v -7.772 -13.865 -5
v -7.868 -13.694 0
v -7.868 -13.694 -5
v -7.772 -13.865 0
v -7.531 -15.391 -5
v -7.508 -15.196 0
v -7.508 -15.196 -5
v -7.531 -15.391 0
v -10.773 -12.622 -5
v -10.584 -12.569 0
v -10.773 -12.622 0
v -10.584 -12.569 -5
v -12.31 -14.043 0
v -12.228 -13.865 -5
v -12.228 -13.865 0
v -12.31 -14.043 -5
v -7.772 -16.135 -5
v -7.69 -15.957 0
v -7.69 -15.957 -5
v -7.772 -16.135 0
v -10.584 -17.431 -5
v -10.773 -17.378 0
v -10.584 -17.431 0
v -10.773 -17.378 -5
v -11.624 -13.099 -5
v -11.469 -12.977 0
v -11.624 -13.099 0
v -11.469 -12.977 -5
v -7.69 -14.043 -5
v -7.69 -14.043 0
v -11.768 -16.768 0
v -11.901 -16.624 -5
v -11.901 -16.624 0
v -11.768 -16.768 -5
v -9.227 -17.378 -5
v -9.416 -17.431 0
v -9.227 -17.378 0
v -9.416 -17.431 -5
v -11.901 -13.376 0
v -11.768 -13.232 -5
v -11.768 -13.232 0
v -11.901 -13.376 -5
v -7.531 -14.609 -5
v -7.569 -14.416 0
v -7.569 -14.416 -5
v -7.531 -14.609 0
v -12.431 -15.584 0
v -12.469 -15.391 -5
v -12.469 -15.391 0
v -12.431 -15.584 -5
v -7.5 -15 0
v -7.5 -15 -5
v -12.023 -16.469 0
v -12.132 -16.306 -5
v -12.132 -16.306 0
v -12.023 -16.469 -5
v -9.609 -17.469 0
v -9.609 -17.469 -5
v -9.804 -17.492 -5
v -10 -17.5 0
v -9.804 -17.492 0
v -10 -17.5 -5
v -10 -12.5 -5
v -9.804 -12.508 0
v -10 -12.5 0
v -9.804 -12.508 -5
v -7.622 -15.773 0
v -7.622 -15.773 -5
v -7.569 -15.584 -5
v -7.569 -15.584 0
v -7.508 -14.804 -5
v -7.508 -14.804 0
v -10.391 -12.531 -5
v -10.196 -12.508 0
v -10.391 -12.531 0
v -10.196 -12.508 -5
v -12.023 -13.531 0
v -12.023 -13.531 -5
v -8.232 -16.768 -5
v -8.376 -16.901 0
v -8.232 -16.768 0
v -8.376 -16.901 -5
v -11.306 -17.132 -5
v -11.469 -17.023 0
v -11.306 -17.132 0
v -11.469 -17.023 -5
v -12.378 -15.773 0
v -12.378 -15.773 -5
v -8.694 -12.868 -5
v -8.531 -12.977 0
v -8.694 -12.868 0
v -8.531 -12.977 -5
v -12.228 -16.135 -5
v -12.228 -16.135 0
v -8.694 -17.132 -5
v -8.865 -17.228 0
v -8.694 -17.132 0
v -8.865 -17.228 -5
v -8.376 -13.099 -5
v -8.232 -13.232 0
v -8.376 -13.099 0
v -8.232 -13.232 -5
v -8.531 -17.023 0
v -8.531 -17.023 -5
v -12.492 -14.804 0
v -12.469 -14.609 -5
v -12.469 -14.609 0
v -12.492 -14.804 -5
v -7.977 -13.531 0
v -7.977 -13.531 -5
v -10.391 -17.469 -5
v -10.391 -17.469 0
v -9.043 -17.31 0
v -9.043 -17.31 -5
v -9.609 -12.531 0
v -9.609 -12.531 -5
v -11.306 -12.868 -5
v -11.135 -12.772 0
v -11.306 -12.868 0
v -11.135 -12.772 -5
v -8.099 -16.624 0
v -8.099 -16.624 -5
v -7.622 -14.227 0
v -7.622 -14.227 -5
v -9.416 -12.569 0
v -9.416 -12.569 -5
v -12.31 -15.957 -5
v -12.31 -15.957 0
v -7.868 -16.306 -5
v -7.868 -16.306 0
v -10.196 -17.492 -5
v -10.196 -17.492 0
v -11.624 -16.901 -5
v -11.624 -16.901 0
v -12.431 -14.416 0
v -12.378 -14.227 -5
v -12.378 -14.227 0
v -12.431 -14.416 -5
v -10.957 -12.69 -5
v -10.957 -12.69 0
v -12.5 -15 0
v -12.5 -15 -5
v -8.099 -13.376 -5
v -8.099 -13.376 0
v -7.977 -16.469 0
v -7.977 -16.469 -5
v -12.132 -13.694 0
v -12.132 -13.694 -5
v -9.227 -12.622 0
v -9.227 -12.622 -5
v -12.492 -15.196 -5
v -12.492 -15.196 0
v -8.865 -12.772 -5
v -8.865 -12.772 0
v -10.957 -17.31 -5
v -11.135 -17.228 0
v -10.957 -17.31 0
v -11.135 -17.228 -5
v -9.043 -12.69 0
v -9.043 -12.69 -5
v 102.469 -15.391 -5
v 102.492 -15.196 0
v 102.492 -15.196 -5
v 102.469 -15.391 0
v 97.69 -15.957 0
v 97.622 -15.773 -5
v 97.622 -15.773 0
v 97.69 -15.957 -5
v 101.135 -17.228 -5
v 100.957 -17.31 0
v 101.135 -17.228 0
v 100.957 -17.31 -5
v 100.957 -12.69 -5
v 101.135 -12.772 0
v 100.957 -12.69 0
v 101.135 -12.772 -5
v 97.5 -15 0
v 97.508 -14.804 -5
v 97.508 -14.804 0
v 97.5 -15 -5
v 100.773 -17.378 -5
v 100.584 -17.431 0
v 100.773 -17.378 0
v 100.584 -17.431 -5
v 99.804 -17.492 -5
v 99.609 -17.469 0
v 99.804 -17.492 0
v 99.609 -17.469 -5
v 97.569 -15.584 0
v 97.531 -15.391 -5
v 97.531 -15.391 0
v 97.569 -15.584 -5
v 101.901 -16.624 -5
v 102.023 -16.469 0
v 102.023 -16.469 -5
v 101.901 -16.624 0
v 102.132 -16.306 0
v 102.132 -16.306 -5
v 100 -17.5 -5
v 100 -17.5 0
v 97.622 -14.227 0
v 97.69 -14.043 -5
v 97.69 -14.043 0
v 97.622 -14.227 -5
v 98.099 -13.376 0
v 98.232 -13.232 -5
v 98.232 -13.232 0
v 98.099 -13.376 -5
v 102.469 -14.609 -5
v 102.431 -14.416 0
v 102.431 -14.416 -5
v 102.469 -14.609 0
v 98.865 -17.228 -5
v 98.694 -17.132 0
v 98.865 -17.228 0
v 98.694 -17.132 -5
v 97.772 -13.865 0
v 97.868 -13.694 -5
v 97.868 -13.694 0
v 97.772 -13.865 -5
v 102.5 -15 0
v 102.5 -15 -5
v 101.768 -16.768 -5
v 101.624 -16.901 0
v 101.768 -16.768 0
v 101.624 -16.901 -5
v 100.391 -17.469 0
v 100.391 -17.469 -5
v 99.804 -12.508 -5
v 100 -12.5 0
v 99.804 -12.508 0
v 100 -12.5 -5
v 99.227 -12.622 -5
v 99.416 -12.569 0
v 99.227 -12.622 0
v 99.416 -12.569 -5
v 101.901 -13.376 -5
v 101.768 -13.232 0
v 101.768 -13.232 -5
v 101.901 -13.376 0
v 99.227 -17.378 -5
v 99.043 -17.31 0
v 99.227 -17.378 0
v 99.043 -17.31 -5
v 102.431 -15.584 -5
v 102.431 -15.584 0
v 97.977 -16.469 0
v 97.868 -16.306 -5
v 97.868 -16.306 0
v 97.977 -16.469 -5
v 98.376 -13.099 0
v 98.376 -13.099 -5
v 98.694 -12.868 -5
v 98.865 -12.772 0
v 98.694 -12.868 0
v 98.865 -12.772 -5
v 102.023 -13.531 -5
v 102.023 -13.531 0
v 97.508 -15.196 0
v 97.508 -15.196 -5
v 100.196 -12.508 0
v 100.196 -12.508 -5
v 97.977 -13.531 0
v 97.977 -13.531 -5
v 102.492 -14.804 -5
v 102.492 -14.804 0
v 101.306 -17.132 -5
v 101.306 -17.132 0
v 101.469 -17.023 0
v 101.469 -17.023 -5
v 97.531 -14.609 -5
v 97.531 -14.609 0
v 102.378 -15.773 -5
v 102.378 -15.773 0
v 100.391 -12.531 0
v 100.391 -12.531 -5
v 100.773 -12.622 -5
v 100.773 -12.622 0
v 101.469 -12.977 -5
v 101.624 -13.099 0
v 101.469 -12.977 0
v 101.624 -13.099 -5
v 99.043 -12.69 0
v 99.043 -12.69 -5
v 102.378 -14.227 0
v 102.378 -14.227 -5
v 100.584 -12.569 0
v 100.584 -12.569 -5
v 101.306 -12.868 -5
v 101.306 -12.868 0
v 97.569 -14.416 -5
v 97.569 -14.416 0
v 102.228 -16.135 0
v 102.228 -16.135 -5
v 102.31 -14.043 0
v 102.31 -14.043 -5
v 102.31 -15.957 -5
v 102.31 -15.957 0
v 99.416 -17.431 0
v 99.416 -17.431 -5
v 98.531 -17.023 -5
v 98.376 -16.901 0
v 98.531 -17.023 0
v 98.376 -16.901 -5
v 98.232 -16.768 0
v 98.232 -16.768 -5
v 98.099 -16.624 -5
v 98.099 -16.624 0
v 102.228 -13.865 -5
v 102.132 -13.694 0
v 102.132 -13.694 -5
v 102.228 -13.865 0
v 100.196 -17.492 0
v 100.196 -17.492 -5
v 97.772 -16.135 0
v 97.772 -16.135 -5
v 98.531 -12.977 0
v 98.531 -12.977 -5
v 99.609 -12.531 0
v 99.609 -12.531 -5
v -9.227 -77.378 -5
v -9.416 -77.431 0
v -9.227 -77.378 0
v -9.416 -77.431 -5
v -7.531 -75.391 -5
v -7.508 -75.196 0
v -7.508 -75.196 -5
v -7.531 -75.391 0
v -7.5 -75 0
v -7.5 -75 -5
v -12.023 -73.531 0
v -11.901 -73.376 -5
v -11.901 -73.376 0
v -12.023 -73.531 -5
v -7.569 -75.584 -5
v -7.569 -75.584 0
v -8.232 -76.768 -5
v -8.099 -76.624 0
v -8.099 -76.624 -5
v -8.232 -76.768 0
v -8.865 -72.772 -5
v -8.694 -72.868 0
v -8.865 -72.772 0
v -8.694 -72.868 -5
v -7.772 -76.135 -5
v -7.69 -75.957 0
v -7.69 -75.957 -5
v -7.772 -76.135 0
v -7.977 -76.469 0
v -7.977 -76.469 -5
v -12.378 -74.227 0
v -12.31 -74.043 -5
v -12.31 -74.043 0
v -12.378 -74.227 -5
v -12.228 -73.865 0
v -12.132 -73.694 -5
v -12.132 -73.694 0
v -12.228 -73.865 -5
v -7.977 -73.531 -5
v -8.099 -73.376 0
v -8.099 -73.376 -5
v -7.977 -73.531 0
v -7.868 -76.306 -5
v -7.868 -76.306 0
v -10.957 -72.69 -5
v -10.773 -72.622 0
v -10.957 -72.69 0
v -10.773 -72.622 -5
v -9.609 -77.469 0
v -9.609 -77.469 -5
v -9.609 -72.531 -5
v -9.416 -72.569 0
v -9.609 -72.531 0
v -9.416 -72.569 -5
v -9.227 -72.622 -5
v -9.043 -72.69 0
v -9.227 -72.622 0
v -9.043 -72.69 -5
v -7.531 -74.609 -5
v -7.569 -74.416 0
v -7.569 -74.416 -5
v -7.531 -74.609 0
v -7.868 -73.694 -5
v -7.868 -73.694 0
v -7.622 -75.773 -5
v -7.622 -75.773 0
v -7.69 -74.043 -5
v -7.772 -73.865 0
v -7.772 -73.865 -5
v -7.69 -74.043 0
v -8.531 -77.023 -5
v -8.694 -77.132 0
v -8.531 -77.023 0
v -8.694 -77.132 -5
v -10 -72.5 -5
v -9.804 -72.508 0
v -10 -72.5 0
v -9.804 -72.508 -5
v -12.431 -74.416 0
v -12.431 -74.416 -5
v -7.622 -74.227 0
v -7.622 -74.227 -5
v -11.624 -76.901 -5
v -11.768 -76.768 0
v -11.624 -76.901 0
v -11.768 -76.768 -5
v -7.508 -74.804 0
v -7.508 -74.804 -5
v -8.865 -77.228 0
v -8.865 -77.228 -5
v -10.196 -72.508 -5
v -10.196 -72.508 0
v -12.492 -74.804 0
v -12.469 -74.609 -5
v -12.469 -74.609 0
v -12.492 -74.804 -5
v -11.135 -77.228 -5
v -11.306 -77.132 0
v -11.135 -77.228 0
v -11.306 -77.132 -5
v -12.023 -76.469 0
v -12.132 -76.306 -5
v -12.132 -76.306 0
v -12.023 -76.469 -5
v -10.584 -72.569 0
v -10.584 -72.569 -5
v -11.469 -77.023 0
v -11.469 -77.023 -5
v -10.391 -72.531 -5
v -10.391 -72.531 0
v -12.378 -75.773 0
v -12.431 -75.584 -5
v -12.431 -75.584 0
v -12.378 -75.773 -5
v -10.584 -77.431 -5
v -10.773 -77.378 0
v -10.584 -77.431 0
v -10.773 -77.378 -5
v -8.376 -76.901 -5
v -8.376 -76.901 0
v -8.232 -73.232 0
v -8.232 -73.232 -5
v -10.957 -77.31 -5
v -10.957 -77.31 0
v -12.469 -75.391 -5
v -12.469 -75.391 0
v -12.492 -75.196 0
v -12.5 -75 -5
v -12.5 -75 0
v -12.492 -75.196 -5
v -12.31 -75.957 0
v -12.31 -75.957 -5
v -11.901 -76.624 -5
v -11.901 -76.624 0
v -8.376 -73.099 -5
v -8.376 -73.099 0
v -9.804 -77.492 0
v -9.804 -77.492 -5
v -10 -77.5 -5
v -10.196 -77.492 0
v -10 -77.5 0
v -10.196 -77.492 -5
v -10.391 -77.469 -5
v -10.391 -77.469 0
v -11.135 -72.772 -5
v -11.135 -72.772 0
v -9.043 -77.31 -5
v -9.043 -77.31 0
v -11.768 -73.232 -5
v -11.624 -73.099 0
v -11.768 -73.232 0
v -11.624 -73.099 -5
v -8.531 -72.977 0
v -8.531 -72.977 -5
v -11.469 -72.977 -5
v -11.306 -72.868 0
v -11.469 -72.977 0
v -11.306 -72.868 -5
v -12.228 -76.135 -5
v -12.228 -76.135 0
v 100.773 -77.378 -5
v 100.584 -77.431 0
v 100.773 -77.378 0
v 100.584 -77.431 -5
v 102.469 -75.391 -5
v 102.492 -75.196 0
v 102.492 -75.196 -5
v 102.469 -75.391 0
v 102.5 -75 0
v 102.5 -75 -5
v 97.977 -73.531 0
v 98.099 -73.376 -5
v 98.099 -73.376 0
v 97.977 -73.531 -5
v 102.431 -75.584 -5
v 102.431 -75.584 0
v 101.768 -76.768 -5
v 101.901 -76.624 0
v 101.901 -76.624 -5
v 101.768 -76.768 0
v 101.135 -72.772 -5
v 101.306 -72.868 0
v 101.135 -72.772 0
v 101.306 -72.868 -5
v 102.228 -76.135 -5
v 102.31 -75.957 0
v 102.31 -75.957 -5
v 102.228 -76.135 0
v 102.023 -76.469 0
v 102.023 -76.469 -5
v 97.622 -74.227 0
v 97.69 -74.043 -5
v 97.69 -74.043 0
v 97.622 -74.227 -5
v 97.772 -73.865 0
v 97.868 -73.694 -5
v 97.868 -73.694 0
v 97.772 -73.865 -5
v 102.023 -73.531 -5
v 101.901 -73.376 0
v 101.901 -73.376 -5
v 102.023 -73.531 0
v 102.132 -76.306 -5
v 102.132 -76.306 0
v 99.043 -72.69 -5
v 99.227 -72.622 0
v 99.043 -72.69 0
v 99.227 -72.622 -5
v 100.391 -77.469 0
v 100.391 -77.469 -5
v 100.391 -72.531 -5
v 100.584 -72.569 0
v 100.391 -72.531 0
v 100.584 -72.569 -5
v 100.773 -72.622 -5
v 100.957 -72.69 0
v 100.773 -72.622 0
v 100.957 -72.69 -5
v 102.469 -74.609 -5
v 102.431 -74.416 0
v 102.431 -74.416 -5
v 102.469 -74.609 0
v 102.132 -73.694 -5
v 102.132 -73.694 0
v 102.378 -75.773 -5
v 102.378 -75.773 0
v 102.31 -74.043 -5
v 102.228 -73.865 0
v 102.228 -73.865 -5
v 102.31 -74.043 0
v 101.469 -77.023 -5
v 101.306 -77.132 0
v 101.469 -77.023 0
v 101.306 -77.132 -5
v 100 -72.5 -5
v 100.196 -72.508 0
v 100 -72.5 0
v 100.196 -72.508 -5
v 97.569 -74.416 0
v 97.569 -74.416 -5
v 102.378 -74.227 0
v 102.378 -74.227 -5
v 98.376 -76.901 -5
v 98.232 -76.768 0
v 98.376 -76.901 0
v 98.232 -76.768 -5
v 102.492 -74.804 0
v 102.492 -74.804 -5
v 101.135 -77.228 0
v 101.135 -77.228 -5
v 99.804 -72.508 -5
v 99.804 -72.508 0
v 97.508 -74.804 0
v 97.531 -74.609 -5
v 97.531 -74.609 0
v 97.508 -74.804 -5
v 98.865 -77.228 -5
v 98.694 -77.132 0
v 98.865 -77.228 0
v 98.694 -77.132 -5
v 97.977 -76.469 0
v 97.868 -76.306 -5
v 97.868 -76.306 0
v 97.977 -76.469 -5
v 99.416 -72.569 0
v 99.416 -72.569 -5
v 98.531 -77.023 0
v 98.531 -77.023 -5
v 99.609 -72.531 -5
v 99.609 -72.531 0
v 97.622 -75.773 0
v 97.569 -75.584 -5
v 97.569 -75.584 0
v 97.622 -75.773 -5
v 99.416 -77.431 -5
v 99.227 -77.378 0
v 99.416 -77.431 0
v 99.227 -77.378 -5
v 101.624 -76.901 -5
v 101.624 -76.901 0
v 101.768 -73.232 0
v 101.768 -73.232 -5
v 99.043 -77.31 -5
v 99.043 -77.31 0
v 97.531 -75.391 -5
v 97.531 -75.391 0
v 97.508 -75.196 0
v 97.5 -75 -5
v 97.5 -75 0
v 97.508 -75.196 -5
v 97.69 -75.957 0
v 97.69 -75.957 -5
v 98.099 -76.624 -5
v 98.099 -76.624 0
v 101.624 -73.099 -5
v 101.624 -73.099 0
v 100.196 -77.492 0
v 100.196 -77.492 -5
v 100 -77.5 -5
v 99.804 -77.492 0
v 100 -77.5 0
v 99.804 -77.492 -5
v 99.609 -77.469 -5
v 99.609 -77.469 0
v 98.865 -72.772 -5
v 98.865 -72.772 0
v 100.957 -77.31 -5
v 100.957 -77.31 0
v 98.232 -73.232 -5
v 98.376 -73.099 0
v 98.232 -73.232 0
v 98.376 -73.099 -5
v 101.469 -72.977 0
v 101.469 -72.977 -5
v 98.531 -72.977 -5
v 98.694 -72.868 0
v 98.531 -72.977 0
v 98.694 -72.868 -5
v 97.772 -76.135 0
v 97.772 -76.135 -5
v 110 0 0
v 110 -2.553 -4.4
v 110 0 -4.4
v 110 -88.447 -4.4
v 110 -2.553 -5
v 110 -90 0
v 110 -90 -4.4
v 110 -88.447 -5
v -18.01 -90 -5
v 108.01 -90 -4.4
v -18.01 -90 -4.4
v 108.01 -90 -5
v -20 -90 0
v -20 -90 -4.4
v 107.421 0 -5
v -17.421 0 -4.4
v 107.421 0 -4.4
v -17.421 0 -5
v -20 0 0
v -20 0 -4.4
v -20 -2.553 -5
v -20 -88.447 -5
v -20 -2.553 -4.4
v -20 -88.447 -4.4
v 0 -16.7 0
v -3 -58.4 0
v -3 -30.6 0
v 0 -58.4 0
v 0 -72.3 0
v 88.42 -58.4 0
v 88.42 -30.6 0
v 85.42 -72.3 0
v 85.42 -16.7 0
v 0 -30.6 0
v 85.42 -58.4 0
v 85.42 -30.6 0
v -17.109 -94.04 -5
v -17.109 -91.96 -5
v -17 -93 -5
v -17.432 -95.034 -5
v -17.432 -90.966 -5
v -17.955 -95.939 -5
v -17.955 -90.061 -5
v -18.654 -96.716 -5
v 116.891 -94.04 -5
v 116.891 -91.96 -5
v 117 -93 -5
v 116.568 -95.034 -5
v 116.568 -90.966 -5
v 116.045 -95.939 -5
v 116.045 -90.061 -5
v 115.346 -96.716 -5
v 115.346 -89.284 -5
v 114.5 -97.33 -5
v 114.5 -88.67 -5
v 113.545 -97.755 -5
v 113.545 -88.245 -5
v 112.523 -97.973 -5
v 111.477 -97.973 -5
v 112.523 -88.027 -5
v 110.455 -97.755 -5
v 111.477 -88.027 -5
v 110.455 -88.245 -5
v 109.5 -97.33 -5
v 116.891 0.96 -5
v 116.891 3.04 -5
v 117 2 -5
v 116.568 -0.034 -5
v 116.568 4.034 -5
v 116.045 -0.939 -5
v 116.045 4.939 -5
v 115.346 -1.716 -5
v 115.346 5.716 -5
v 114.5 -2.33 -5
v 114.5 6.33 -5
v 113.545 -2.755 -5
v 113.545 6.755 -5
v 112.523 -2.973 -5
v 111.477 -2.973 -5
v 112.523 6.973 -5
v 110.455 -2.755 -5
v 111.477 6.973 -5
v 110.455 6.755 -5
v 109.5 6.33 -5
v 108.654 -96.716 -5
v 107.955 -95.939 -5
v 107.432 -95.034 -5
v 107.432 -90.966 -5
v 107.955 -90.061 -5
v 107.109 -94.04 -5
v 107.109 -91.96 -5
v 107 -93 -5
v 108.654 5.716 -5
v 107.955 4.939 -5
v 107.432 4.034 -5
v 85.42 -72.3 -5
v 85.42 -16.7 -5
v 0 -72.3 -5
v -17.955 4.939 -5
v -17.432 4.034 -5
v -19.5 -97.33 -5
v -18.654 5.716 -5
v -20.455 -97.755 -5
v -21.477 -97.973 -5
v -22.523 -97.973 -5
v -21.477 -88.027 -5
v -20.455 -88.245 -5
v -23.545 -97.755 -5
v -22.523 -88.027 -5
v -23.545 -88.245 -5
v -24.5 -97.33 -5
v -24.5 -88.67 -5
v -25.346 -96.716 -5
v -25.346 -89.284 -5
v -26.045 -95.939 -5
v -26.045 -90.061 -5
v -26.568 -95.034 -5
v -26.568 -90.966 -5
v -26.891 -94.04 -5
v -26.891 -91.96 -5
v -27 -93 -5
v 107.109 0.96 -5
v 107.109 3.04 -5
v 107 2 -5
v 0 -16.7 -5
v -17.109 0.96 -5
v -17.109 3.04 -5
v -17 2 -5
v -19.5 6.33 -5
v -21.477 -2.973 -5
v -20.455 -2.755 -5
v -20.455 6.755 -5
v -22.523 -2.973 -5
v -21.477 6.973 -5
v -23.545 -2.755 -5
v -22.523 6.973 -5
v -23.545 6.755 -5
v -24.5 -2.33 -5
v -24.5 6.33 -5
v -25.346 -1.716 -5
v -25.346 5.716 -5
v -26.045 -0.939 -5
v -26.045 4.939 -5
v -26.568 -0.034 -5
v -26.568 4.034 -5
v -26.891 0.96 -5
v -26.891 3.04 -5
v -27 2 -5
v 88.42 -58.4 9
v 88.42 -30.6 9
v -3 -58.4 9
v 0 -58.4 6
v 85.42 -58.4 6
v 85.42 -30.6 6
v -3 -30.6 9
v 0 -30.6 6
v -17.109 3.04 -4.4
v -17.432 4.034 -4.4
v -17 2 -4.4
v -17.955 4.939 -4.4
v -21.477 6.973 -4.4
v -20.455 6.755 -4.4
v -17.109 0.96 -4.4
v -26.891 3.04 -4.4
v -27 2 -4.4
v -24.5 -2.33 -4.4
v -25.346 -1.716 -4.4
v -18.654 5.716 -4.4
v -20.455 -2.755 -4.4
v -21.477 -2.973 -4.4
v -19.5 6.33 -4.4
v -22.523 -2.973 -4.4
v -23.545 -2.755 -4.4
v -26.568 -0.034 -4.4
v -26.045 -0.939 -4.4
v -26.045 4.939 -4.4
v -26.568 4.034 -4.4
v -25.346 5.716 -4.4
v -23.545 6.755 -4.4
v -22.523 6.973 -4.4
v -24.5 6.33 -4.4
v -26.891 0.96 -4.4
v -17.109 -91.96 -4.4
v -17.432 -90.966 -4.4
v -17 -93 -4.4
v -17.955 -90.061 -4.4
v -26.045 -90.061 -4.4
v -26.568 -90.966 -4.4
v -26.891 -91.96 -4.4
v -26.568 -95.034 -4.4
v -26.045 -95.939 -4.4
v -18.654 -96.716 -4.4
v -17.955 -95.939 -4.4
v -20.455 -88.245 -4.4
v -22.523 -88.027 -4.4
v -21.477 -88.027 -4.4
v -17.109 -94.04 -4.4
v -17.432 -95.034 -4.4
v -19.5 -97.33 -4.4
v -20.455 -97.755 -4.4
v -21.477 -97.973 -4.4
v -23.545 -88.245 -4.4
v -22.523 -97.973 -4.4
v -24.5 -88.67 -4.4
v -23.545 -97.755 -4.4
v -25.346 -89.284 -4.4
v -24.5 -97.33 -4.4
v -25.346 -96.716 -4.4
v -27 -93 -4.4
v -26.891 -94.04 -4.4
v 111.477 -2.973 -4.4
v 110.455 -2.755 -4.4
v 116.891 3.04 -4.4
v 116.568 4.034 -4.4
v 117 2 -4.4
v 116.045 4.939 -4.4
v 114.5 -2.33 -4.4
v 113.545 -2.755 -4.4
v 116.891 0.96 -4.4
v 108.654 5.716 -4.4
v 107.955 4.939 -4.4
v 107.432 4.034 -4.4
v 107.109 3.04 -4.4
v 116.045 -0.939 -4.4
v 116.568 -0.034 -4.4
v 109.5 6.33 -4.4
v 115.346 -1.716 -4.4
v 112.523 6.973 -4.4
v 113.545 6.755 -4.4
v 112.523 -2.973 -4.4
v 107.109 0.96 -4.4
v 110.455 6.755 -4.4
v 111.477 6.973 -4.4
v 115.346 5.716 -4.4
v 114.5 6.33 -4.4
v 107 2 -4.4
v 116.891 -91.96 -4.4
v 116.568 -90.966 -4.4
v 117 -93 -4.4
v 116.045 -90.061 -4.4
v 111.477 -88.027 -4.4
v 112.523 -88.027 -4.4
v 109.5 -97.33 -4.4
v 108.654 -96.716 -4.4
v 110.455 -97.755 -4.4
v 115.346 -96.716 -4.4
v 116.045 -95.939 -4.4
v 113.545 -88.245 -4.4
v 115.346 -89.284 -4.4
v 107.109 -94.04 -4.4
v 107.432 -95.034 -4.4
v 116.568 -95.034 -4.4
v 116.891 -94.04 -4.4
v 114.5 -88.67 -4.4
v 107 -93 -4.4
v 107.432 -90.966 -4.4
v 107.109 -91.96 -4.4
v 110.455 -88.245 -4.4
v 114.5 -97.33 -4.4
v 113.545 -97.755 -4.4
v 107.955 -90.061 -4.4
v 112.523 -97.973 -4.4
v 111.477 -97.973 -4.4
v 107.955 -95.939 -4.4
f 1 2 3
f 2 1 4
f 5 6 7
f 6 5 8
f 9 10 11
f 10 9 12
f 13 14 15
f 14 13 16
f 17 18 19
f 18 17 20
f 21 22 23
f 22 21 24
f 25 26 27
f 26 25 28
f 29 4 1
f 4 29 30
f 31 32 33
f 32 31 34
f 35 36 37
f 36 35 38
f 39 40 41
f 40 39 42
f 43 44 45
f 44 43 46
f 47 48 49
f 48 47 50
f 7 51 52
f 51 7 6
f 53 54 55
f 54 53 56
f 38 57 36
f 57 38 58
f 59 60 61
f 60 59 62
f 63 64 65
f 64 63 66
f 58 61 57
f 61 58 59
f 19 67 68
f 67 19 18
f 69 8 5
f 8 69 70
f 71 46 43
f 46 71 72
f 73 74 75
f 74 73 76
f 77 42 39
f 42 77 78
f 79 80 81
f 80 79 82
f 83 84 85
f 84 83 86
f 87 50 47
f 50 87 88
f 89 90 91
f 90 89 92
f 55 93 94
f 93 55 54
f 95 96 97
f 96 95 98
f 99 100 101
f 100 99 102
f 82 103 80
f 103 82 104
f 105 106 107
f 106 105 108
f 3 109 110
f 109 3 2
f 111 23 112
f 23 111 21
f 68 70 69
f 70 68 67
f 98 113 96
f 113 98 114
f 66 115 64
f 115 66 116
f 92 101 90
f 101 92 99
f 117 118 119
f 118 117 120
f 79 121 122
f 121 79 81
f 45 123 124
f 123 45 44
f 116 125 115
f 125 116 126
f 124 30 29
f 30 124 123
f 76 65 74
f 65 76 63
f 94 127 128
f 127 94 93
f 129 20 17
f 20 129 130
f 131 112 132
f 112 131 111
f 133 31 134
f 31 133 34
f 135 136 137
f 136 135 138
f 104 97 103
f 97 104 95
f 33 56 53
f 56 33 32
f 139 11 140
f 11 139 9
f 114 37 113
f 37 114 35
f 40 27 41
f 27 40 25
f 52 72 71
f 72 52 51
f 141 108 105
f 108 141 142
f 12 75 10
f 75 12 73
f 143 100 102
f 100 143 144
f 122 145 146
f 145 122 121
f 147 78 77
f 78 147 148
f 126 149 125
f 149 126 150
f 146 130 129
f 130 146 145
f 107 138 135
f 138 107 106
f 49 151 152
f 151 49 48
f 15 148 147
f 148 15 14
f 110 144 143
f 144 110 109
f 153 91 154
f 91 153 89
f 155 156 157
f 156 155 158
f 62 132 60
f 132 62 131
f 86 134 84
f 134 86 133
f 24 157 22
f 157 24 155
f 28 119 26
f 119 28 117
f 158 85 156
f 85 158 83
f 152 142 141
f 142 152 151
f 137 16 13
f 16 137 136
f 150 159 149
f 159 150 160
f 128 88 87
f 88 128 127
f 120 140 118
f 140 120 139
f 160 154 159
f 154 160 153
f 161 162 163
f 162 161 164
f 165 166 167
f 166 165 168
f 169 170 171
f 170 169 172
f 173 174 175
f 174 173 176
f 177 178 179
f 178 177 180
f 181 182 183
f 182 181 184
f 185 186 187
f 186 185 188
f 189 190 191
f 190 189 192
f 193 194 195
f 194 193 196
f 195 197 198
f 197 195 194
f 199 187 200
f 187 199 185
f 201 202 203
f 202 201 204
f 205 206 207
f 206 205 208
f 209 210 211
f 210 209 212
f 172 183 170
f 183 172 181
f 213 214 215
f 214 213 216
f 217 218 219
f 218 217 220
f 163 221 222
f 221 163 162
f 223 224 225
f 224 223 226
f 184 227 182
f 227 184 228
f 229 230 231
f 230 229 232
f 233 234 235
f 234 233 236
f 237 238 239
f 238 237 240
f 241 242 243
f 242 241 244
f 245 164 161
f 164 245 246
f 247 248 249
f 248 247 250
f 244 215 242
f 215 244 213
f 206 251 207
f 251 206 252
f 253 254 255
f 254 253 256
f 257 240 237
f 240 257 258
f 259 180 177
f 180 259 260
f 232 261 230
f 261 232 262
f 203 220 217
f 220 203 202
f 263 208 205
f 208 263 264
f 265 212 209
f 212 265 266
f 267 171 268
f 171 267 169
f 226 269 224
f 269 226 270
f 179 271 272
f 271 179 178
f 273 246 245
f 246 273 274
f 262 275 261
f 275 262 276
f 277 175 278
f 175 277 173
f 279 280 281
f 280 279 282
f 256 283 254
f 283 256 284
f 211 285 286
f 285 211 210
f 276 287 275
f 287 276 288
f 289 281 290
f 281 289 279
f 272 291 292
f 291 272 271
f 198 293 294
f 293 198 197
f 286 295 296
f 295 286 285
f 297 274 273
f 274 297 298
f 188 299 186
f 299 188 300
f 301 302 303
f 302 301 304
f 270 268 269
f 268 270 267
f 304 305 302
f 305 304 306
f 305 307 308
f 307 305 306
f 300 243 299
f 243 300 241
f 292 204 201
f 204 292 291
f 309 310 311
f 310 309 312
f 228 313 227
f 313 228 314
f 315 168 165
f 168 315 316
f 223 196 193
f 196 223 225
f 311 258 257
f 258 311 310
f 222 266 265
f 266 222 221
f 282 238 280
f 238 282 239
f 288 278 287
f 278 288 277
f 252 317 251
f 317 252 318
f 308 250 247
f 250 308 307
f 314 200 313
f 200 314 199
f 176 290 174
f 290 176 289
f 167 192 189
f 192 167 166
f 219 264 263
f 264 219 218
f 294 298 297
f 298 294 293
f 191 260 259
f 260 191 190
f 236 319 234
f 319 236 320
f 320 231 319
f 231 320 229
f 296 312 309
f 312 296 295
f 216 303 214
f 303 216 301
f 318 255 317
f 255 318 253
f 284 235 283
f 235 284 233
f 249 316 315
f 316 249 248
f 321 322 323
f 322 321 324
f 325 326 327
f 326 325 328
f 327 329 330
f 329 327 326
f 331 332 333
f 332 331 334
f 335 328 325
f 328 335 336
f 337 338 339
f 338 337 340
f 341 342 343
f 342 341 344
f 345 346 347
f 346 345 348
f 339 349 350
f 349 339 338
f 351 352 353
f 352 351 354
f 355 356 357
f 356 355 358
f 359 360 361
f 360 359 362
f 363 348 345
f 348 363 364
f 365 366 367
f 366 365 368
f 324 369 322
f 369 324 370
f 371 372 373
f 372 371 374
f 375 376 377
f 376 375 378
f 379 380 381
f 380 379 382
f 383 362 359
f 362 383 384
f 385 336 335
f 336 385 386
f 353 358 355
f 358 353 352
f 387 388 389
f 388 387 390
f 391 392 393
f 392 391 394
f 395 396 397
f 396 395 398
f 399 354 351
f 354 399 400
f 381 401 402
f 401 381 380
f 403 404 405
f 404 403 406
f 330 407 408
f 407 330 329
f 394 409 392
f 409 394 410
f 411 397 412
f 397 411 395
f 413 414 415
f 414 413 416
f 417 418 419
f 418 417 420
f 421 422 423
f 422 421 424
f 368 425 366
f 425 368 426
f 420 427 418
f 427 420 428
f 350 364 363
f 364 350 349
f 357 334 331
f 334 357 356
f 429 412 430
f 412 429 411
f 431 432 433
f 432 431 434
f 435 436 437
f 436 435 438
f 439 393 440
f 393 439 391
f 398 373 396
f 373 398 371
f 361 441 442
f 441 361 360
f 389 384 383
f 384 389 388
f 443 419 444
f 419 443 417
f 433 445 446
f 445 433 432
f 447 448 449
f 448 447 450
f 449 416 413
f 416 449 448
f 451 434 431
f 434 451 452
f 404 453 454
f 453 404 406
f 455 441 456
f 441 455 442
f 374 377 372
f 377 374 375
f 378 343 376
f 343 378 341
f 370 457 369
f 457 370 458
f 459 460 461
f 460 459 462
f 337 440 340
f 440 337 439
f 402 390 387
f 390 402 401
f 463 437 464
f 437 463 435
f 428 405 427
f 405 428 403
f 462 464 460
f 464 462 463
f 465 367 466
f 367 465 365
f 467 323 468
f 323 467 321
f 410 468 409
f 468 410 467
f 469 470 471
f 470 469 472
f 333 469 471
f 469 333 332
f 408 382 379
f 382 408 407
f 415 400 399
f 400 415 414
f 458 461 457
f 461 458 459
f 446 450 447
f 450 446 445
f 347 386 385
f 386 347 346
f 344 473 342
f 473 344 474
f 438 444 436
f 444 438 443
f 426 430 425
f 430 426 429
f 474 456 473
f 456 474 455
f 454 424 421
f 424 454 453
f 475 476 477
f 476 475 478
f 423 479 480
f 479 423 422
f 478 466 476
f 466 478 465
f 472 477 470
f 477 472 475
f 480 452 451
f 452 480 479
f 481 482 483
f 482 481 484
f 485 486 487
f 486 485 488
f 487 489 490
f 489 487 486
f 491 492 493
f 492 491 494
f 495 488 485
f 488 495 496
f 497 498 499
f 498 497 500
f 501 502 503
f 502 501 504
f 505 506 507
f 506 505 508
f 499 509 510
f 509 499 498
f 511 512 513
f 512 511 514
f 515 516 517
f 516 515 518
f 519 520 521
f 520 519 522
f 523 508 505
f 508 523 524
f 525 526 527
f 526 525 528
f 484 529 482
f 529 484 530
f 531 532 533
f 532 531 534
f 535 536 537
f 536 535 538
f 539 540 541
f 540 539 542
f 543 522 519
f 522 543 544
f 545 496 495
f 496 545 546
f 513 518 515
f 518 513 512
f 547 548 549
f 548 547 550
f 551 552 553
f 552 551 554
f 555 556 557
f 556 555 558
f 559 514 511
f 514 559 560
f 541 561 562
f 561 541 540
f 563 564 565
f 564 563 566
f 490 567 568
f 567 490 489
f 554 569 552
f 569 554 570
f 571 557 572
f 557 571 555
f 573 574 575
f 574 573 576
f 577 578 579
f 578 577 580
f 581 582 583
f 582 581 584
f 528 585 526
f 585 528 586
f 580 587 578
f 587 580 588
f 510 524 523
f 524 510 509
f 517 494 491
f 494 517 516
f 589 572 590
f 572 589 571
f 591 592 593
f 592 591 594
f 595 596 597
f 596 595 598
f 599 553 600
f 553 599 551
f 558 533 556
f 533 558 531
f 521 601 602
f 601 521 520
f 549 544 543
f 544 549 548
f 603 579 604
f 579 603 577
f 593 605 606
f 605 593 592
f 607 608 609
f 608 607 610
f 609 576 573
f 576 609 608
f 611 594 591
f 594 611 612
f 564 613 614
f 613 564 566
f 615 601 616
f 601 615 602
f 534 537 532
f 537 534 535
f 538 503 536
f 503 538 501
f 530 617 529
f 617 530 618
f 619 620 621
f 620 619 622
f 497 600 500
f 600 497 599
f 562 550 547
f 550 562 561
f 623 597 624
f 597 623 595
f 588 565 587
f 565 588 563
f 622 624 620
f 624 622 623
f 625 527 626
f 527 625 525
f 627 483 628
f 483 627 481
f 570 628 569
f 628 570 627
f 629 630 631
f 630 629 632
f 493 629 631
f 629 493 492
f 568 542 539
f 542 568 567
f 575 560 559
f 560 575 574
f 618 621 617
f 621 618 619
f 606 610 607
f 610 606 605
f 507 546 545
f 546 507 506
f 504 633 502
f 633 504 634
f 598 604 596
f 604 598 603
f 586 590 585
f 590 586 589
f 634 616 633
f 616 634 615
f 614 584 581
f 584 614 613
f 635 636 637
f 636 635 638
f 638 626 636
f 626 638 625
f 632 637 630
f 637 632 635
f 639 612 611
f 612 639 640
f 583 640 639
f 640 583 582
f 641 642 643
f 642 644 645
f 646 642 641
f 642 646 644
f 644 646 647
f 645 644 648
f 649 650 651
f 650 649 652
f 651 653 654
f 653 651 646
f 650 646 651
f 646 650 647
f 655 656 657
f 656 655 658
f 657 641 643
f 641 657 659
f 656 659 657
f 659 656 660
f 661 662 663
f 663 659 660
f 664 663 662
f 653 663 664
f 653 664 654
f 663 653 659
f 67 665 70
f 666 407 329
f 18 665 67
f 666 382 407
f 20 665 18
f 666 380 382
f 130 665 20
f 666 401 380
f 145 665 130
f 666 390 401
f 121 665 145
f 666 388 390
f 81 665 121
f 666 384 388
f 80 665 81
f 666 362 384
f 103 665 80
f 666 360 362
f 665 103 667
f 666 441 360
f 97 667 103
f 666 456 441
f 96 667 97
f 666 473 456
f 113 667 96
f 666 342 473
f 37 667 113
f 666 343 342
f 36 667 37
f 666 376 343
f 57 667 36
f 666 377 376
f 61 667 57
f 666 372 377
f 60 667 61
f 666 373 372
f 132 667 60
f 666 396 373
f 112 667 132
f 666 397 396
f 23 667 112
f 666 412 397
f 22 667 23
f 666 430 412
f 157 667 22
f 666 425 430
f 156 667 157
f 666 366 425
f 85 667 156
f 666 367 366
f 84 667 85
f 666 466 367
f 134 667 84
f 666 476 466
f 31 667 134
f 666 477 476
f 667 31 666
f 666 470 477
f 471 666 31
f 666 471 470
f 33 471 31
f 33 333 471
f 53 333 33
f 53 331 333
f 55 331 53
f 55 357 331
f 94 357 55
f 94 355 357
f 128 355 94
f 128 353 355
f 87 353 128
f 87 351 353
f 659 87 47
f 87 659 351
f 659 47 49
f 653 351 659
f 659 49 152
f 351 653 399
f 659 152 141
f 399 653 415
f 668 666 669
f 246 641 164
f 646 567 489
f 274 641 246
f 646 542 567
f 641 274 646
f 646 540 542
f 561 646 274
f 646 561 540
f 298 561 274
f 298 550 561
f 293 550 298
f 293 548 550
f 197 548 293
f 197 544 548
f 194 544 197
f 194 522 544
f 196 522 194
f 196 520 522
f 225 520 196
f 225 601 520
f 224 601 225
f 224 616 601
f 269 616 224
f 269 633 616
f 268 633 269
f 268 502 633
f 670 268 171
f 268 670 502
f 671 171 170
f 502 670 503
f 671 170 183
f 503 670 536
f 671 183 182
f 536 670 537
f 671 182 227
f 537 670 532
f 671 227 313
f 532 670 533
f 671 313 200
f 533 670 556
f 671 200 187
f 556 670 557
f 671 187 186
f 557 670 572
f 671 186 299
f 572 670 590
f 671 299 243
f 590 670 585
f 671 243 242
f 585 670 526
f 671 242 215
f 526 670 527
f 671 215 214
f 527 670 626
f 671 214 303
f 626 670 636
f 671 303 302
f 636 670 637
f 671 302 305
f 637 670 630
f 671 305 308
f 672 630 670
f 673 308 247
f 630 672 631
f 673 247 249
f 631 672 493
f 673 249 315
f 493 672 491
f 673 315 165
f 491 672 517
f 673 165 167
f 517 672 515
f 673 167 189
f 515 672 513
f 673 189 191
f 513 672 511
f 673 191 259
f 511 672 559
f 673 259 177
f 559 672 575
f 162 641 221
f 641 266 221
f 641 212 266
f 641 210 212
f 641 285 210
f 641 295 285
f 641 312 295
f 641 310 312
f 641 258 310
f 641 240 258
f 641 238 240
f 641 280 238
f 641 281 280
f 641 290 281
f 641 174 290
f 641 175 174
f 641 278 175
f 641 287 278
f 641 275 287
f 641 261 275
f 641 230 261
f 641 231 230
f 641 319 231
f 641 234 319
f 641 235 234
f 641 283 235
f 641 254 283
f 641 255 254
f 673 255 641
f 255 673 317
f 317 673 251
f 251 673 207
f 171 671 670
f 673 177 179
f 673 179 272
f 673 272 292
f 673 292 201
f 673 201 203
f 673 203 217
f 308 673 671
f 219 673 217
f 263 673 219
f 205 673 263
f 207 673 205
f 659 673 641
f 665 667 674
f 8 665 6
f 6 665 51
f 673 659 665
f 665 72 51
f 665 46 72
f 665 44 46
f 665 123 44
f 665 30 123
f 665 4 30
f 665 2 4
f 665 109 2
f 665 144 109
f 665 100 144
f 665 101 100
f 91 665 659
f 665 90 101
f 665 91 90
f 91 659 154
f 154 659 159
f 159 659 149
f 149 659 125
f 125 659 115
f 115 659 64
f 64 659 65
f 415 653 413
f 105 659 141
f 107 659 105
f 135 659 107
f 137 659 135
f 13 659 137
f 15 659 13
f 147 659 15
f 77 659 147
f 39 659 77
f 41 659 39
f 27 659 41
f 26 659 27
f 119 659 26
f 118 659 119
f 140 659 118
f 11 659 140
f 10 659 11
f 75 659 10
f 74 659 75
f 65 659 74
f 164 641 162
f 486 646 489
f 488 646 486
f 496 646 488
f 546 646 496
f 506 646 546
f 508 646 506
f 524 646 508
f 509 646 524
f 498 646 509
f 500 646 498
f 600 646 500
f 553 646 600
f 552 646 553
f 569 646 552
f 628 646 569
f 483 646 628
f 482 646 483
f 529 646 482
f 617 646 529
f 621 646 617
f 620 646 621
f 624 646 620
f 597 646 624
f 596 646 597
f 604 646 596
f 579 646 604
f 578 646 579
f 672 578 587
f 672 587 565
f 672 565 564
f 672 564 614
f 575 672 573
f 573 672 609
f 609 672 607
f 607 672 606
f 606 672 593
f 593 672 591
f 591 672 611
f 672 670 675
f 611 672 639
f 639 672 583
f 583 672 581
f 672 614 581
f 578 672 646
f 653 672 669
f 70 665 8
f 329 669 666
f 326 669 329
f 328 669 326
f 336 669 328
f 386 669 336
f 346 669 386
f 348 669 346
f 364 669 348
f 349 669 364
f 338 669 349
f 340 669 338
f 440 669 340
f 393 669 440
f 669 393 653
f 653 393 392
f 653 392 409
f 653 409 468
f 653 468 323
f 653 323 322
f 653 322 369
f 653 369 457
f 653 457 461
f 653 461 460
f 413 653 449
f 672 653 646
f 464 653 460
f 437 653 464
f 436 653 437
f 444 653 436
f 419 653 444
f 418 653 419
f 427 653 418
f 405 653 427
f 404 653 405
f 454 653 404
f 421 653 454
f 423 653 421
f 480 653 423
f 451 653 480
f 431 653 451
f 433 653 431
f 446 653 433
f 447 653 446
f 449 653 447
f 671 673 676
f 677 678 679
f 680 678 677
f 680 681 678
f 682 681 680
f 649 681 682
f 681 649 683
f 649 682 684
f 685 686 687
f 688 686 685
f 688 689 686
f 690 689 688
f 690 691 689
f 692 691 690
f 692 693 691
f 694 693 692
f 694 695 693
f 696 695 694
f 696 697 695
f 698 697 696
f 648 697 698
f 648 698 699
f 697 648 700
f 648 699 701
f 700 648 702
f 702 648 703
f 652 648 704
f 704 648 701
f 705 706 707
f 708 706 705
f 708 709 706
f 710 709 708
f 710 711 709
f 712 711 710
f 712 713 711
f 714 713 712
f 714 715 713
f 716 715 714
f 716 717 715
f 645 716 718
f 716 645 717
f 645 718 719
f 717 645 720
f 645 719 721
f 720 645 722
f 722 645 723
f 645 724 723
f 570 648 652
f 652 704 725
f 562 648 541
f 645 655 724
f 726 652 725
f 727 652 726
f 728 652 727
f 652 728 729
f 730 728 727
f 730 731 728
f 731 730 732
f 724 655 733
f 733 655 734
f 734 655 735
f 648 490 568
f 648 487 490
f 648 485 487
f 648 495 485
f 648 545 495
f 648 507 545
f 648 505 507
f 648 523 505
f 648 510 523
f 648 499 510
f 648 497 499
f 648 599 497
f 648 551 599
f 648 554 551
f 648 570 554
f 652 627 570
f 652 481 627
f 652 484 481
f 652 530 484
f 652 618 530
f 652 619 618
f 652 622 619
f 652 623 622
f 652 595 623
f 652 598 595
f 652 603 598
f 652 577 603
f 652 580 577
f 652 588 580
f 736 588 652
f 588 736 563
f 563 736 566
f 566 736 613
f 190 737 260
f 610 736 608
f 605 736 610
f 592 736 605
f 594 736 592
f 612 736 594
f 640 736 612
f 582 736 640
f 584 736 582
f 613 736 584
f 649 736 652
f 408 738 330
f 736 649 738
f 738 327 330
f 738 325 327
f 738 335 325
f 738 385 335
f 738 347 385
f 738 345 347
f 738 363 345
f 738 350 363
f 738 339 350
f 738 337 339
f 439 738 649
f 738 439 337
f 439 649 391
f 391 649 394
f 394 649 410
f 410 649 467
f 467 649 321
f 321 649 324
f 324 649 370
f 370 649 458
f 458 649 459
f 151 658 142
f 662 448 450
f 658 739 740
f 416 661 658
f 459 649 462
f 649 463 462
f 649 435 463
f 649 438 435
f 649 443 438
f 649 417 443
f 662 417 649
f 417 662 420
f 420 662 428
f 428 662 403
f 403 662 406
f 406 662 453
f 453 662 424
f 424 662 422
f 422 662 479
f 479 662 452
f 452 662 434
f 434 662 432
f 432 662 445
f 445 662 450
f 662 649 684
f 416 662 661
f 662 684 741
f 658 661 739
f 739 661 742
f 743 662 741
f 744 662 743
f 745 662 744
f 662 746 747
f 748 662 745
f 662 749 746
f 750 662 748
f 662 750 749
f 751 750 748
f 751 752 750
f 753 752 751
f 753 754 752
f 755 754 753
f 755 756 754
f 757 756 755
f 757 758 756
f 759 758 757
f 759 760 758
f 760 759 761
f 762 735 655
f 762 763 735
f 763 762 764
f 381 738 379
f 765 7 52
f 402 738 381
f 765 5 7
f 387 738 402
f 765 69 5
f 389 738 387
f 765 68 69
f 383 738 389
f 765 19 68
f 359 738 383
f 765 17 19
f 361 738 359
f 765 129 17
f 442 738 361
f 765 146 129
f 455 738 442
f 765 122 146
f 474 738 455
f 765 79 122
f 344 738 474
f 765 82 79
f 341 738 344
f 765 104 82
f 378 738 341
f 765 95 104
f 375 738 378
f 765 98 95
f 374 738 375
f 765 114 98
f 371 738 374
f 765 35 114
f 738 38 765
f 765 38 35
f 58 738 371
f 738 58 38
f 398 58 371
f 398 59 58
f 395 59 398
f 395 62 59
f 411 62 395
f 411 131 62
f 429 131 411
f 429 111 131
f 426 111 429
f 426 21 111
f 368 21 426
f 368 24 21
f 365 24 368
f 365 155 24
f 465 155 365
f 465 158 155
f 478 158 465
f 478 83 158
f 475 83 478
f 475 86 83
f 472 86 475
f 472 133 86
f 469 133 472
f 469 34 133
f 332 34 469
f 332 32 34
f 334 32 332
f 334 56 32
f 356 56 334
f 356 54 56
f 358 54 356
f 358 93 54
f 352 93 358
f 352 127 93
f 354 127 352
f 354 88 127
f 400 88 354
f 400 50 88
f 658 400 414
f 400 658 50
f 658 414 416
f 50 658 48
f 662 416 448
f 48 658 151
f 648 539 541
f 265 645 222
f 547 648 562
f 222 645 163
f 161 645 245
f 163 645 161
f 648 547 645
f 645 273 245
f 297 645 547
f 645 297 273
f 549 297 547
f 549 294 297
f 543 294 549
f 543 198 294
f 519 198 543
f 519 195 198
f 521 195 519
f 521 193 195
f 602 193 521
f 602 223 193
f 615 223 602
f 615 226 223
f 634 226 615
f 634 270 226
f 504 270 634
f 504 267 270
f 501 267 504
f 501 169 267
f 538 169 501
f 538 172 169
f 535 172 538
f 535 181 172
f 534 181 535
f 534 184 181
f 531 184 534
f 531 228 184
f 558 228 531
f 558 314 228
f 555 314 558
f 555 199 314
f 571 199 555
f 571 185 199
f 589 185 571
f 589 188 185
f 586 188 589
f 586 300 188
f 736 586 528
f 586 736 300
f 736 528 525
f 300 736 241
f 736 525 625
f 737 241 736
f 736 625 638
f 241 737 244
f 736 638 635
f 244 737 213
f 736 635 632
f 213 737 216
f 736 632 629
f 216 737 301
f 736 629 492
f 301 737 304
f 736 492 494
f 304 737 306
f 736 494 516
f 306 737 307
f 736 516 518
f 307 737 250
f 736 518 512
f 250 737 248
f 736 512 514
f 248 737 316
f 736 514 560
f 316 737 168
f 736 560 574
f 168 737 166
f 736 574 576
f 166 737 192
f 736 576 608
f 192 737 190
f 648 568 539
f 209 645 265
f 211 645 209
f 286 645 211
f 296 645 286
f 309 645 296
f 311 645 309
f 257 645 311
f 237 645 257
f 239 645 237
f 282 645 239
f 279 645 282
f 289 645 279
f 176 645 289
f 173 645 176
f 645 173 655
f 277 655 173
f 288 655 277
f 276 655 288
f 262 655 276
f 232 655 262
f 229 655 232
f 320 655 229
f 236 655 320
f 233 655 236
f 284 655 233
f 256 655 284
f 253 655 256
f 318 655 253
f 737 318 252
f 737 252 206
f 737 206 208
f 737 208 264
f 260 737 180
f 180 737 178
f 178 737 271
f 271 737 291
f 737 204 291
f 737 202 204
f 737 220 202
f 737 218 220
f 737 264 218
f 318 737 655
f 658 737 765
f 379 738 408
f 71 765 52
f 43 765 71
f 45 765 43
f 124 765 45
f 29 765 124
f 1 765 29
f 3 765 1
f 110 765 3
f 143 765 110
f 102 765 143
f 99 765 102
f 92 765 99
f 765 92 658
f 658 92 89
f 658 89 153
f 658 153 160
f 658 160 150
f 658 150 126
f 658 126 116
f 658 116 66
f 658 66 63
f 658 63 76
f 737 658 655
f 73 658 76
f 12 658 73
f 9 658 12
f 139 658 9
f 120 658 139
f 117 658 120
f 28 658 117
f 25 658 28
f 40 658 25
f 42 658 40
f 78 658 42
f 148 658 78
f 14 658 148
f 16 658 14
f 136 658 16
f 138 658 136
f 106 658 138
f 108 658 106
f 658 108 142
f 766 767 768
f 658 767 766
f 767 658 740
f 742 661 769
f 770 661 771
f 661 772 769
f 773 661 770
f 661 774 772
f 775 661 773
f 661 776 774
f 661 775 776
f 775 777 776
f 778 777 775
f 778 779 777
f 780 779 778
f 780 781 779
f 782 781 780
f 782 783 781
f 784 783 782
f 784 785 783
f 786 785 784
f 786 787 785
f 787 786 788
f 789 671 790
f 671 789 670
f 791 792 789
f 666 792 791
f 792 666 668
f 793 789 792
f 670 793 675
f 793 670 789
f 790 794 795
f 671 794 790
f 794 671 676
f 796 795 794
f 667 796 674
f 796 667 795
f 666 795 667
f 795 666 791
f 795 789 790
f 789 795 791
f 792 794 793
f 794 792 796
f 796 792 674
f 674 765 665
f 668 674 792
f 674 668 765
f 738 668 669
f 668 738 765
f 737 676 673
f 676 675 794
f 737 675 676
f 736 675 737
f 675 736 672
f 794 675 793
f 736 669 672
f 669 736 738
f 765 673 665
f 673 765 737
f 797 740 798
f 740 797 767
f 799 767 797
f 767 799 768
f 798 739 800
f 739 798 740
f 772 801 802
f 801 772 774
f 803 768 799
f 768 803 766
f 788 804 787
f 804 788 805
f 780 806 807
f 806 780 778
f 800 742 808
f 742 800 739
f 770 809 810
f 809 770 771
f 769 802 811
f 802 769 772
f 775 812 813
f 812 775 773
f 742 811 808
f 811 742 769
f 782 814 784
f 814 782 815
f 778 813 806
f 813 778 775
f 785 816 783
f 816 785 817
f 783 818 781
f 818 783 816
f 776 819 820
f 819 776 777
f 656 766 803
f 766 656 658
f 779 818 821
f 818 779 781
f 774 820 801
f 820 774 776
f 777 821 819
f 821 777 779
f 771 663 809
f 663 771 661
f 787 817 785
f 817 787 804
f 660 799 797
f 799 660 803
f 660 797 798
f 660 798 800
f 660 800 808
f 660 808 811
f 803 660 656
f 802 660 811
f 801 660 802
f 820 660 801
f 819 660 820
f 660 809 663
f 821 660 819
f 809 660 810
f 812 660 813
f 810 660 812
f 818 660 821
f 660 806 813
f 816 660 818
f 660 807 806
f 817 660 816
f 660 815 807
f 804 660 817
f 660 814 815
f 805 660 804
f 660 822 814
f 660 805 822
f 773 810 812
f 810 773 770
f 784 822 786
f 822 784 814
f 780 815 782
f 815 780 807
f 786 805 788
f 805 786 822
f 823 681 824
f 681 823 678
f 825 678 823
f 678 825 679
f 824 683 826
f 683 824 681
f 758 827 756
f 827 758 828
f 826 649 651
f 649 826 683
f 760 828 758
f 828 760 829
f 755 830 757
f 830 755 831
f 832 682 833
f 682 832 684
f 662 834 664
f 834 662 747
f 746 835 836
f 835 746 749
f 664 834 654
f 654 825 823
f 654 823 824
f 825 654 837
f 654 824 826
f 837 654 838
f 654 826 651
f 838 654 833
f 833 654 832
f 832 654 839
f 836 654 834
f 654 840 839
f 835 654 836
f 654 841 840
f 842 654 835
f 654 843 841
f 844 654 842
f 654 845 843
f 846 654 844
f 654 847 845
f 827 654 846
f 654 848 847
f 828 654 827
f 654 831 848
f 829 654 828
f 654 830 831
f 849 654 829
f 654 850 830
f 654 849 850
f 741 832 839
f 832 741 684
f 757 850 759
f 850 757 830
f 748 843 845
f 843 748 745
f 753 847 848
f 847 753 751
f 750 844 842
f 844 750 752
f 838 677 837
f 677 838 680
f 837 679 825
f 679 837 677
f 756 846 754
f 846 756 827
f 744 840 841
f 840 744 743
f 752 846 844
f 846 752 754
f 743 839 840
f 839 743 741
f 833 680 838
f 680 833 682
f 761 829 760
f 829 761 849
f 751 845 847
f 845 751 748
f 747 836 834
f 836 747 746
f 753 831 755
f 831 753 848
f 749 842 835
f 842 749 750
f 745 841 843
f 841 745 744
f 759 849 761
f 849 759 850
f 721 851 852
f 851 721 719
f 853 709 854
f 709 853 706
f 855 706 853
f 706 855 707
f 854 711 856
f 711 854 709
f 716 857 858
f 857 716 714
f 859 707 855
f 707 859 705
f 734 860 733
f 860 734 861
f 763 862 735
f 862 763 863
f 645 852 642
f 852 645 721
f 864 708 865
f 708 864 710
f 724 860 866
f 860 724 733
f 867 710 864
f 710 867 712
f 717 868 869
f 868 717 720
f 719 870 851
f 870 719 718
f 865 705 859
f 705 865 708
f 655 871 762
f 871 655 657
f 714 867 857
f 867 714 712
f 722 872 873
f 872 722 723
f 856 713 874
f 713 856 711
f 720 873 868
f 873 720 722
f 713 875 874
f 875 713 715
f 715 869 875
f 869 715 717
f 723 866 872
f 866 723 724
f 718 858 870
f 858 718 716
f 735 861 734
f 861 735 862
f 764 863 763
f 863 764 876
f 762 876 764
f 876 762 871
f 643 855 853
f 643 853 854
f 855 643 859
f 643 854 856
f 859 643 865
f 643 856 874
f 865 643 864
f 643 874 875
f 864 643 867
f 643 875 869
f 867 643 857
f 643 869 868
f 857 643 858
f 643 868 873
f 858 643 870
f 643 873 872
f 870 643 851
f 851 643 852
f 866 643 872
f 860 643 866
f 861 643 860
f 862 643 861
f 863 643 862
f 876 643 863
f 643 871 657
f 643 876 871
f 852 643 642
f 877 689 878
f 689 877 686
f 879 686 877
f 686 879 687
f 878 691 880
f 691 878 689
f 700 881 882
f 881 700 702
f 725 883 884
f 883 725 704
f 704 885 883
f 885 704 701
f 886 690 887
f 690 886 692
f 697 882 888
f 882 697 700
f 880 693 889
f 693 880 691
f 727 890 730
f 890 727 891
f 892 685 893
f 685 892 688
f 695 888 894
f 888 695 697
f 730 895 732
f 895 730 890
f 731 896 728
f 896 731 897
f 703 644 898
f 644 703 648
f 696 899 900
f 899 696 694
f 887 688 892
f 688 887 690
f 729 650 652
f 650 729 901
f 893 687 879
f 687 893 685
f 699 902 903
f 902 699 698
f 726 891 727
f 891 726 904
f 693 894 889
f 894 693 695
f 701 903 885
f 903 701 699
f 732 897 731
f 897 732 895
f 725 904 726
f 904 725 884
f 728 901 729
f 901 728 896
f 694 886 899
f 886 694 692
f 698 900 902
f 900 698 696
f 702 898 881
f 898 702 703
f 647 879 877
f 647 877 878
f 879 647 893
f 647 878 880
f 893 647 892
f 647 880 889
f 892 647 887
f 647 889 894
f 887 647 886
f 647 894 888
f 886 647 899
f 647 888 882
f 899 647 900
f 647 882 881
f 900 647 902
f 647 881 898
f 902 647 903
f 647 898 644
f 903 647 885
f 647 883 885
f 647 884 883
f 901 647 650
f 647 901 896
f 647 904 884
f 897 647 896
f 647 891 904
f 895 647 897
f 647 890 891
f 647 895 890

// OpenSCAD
// file: ../led.scad
/*
 * This code is licensed under the CC BY-NC-SA 4.0 (Attribution-NonCommercial-ShareAlike).
 * Please read LICENCE.md for full details.
 *
 * Various modules for LED mounts
 */

module Led(d,t) {
    translate([0,0,-1])
        cylinder(r=(d/2)+.25, h=t+2, $fn=80);
    // Show cutout for walls too thick for a 3mm LED
    if( t > 3 ) {
        //translate([0,0,3])
        Led(4,t-3);
    }
}

module Led3(t) {
    Led(3,t);
}

module Led5(t) {
    Led(5,t);
}

Led3(5);
// file: ../raspberryPiTray.scad
/*
 * This code is licensed under the CC BY-NC-SA 4.0 (Attribution-NonCommercial-ShareAlike).
 * Please read LICENCE.md for full details.
 *
 * Raspberry PI mount
 *
 * Hat specification:
 * https://github.com/raspberrypi/hats/blob/master/hat-board-mechanical.pdf
 */

use <warpDisk.scad>;
use <boltHoles.scad>;
use <led.scad>;
use <faceplate.scad>;

// Led size, either 5 or 3mm depending on the available LED's
//ledSize=5;
ledSize=3;

/*
 * height   height of panel in U, default 1
 */
module RaspberryPI( height=1 ) {
    union() {
        // Face plate
        FacePlate(height);

        // PI mounting plate
        translate([ 15, -1, 0]) difference() {
            // frame
            union() {
                cube([ 57, 76, 5 ]);
                WarpDisk(57,80,0);
                WarpDisk(0,80,0);
                //WarpDisk(57,0,0);
                //WarpDisk(0,0,0);
            }

            // cut out unwanted space to save plastic
            translate([10, 15, -1])
                cube([57-20, 55, 7]);

            translate([0, 10, 0]) {
                translate([3.5, 3.5, 0]) {
                    RaspberryPIHole();
                    translate([49, 0, 0]) RaspberryPIHole();
                    translate([0, 58, 0]) {
                        RaspberryPIHole();
                        translate([49, 0, 0]) RaspberryPIHole();
                    }
                }
            }
        }
    }
}

module RaspberryPIHole() {
    MHole(2.5,5);
    MHole(6,2);
}

// RaspberryPI with 3mm led's.
// The led's are arranged with a single one at the top
// and 4 at the bottom in a 2x2 arrangement
module RaspberryPI_3mLed() {
    difference() {
        RaspberryPI();

        // Top LED
        translate([ 5, 0, 15]) rotate([90,0,0]) Led(ledSize, 5);

        // Bottom LED's
        translate([85, 0, 10]) rotate([90,0,0]) Led(ledSize, 5);
        translate([85, 0, 20]) rotate([90,0,0]) Led(ledSize, 5);

        translate([77.5, 0, 10]) rotate([90,0,0]) Led(ledSize, 5);
        translate([77.5, 0, 20]) rotate([90,0,0]) Led(ledSize, 5);
    }
}
// file: ../faceplate.scad
/*
 * This code is licensed under the CC BY-NC-SA 4.0 (Attribution-NonCommercial-ShareAlike).
 * Please read LICENCE.md for full details.
 *
 * Faceplates
 *
 */

use <boltHoles.scad>;

rack1UWidth=30;
rack1UHeight=90;
rack1UHmargin=20;
facePlateThickness=5;

/*
 * Basic faceplate placed in the correct location & mounting holes present.
 *
 * width    width in U
 * height   height in U, default 1
 * holes    custom hole position as a vector. Default [1] for width=1, or [1,3w-1] for width >=2
 */
module FacePlate(width, height=1, holes, fpt=facePlateThickness) {
    // Number & position of mounting holes
    holeStep = holes ? holes : width < 2 ? [1] : [1,(3*width)-2];
    h = (2*rack1UHmargin) + (height*rack1UHeight);

    translate([ -rack1UHmargin, -fpt, 0])
        difference() {
            cube([ h,
                   fpt,
                   width * rack1UWidth ]);

            for( x = holeStep ) {
                translate([10, 5, 5+(10*x)])
                    rotate([90,0,0])
                    MHole(4, fpt+2);

                translate([(height*rack1UHeight)+rack1UHmargin+10, 5, 5+(10*x)])
                    rotate([90,0,0])
                    MHole(4, fpt+2);
            }
        }
}
// file: ../boltHoles.scad
/*
 * This code is licensed under the CC BY-NC-SA 4.0 (Attribution-NonCommercial-ShareAlike).
 * Please read LICENCE.md for full details.
 *
 * A set of modules for creating bolt holes at specific sizes
 *
 * All of these modules will render flat on the XY plane and centered on the origin.
 * Heights are measured along the Y axis.
 * Widths are measured along the X axis.
 * Thickness are measured along the Z axis.
 */

/*
 * M mounting hole. Radius is (Msize/2) + 0.25mm
 * The 0.5mm gives some extra room so the bolt does not get restricted by the plastic & is free to move.
 *
 * size The size of the hole, e.g. 4 for a M4 bolt
 * t    The thickness of the material the hole is in
 */
module MHole(size,t) {
    translate([0, 0, -1]) cylinder( r=(size/2)+.5, h=t+2, $fn=80);
}

/*
 * A rectangular slotted hole for bolts, used so there's some directional movement in attaching something.
 *
 * boltSize     The diameter of the bolt this slot is to fit. 0.5mm either side will be included in the slot
 * height       The height of the slot in mm
 * thickness    The thickness of the material the slot is to cut out.
 */
 module BoltSlot( boltSize,height, thickness) {
    translate([-(boltSize+1)/2,-height/2,-(thickness+1)/2])
        cube([boltSize+1, height, thickness+1]);
 }

/*
 * A bar with multiple slots cut out of it
 *
 * width The width of the bar
 * height The height of the bar
 * thickness The thickness of the bar
 * boltSize The size of bolt that will be used in the slot, remember slots are 10mm apart!
 * baseOffset The offset from the bottom to the bottom of the slot
 * topOffset The offset from the top of the slot from the top of the bar
 */
module SlottedBar(width, height, thickness, boltSize, baseOffset, topOffset) {
    bo = baseOffset <=0 ? thickness : baseOffset;
    to = topOffset <= 0 ? thickness : topOffset;
    
    // Y offset to middle of slot
    dy = baseOffset + ((height-baseOffset-topOffset)/2);
    
    // last slot index that fits, first slot is #0
    numSlots = floor(width/10)-1;
    
    translate([-width/2, -height/2, -thickness/2])
        difference() {
            // Actual bar
            cube([width, height, thickness]);
            for( n = [0:numSlots] ) {
                translate([ 5+(10*n), dy, thickness/2 ])
                    BoltSlot( boltSize, height-baseOffset-topOffset, thickness );
            }
        }
}

SlottedBar( 100, 20, 5, 4, 5, 5 );

translate([0,30,0])
SlottedBar( 100, 20, 5, 4, 7, 5 );

//BoltSlot( 4, 20, 5);
// file: ../warpDisk.scad
/*
 * This code is licensed under the CC BY-NC-SA 4.0 (Attribution-NonCommercial-ShareAlike).
 * Please read LICENCE.md for full details.
 *
 * A warp disk which is a simple 10mm x 0.6mm disk which is placed just touching a base corner of your model.
 * These disks then give the model extra area against a heated base plate on the printer and help in reducing
 * warping of the model
 */

module WarpDisk(x,y,z) {
    translate([x,y,z]) cylinder(r=5,h=.6,$fn=30);
}
// main file
/*
 * A 2U tray for a Raspberry PI 3A with an
 * Elegoo 3.5" TCT LCD 480x320 screen mounted in
 * portrait.
 *
 * Although this screen isn't great in refresh
 * performance (I've not tried graphics with this
 * screen) it is brilliant when used as a text
 * console - just don't expect it to be the same
 * as a traditional monitor.
 *
 * Associated with this model is a keyboard try
 * as it's also used with a small wireless keyboard
 * of the type used for small media centre systems.
 *
 * Note: This is not an endorsement/advert for this
 * specific screen, just that I tried one and this
 * is the resulting result.
 *
 * TFT screen: https://smile.amazon.co.uk/gp/product/B01MRQTMTD/ref=ppx_yo_dt_b_asin_title_o01_s00?ie=UTF8&psc=1
 */
 
use <../warpDisk.scad>;
use <../boltHoles.scad>;
use <../faceplate.scad>;
use <../raspberryPiTray.scad>;

module ConsolePI() {
    // Dimensions of display in portrait mode
    // values from PDF on supplied CDRom
    dw=55.6;
    dh=85.42;
    
    difference() {
        union() {
            // Face plate
            FacePlate(3);
            translate([-3,12-6,(89-(dw/2))/2])
                cube([dh+6,3,dw/2]);
            translate([-3,0,(89-(dw/2))/2])
                cube([3,9,dw/2]);
            translate([dh,0,(89-(dw/2))/2])
                cube([3,9,dw/2]);
        }
        // Display cutout
        translate([0,-6,(89-dw)/2])
            cube([dh,12,dw]);
    }
}

rotate([90,0,0]) ConsolePI();
WarpDisk(-22,2,-5);
WarpDisk(-22,-93,-5);
WarpDisk(112,2,-5);
WarpDisk(112,-93,-5);
